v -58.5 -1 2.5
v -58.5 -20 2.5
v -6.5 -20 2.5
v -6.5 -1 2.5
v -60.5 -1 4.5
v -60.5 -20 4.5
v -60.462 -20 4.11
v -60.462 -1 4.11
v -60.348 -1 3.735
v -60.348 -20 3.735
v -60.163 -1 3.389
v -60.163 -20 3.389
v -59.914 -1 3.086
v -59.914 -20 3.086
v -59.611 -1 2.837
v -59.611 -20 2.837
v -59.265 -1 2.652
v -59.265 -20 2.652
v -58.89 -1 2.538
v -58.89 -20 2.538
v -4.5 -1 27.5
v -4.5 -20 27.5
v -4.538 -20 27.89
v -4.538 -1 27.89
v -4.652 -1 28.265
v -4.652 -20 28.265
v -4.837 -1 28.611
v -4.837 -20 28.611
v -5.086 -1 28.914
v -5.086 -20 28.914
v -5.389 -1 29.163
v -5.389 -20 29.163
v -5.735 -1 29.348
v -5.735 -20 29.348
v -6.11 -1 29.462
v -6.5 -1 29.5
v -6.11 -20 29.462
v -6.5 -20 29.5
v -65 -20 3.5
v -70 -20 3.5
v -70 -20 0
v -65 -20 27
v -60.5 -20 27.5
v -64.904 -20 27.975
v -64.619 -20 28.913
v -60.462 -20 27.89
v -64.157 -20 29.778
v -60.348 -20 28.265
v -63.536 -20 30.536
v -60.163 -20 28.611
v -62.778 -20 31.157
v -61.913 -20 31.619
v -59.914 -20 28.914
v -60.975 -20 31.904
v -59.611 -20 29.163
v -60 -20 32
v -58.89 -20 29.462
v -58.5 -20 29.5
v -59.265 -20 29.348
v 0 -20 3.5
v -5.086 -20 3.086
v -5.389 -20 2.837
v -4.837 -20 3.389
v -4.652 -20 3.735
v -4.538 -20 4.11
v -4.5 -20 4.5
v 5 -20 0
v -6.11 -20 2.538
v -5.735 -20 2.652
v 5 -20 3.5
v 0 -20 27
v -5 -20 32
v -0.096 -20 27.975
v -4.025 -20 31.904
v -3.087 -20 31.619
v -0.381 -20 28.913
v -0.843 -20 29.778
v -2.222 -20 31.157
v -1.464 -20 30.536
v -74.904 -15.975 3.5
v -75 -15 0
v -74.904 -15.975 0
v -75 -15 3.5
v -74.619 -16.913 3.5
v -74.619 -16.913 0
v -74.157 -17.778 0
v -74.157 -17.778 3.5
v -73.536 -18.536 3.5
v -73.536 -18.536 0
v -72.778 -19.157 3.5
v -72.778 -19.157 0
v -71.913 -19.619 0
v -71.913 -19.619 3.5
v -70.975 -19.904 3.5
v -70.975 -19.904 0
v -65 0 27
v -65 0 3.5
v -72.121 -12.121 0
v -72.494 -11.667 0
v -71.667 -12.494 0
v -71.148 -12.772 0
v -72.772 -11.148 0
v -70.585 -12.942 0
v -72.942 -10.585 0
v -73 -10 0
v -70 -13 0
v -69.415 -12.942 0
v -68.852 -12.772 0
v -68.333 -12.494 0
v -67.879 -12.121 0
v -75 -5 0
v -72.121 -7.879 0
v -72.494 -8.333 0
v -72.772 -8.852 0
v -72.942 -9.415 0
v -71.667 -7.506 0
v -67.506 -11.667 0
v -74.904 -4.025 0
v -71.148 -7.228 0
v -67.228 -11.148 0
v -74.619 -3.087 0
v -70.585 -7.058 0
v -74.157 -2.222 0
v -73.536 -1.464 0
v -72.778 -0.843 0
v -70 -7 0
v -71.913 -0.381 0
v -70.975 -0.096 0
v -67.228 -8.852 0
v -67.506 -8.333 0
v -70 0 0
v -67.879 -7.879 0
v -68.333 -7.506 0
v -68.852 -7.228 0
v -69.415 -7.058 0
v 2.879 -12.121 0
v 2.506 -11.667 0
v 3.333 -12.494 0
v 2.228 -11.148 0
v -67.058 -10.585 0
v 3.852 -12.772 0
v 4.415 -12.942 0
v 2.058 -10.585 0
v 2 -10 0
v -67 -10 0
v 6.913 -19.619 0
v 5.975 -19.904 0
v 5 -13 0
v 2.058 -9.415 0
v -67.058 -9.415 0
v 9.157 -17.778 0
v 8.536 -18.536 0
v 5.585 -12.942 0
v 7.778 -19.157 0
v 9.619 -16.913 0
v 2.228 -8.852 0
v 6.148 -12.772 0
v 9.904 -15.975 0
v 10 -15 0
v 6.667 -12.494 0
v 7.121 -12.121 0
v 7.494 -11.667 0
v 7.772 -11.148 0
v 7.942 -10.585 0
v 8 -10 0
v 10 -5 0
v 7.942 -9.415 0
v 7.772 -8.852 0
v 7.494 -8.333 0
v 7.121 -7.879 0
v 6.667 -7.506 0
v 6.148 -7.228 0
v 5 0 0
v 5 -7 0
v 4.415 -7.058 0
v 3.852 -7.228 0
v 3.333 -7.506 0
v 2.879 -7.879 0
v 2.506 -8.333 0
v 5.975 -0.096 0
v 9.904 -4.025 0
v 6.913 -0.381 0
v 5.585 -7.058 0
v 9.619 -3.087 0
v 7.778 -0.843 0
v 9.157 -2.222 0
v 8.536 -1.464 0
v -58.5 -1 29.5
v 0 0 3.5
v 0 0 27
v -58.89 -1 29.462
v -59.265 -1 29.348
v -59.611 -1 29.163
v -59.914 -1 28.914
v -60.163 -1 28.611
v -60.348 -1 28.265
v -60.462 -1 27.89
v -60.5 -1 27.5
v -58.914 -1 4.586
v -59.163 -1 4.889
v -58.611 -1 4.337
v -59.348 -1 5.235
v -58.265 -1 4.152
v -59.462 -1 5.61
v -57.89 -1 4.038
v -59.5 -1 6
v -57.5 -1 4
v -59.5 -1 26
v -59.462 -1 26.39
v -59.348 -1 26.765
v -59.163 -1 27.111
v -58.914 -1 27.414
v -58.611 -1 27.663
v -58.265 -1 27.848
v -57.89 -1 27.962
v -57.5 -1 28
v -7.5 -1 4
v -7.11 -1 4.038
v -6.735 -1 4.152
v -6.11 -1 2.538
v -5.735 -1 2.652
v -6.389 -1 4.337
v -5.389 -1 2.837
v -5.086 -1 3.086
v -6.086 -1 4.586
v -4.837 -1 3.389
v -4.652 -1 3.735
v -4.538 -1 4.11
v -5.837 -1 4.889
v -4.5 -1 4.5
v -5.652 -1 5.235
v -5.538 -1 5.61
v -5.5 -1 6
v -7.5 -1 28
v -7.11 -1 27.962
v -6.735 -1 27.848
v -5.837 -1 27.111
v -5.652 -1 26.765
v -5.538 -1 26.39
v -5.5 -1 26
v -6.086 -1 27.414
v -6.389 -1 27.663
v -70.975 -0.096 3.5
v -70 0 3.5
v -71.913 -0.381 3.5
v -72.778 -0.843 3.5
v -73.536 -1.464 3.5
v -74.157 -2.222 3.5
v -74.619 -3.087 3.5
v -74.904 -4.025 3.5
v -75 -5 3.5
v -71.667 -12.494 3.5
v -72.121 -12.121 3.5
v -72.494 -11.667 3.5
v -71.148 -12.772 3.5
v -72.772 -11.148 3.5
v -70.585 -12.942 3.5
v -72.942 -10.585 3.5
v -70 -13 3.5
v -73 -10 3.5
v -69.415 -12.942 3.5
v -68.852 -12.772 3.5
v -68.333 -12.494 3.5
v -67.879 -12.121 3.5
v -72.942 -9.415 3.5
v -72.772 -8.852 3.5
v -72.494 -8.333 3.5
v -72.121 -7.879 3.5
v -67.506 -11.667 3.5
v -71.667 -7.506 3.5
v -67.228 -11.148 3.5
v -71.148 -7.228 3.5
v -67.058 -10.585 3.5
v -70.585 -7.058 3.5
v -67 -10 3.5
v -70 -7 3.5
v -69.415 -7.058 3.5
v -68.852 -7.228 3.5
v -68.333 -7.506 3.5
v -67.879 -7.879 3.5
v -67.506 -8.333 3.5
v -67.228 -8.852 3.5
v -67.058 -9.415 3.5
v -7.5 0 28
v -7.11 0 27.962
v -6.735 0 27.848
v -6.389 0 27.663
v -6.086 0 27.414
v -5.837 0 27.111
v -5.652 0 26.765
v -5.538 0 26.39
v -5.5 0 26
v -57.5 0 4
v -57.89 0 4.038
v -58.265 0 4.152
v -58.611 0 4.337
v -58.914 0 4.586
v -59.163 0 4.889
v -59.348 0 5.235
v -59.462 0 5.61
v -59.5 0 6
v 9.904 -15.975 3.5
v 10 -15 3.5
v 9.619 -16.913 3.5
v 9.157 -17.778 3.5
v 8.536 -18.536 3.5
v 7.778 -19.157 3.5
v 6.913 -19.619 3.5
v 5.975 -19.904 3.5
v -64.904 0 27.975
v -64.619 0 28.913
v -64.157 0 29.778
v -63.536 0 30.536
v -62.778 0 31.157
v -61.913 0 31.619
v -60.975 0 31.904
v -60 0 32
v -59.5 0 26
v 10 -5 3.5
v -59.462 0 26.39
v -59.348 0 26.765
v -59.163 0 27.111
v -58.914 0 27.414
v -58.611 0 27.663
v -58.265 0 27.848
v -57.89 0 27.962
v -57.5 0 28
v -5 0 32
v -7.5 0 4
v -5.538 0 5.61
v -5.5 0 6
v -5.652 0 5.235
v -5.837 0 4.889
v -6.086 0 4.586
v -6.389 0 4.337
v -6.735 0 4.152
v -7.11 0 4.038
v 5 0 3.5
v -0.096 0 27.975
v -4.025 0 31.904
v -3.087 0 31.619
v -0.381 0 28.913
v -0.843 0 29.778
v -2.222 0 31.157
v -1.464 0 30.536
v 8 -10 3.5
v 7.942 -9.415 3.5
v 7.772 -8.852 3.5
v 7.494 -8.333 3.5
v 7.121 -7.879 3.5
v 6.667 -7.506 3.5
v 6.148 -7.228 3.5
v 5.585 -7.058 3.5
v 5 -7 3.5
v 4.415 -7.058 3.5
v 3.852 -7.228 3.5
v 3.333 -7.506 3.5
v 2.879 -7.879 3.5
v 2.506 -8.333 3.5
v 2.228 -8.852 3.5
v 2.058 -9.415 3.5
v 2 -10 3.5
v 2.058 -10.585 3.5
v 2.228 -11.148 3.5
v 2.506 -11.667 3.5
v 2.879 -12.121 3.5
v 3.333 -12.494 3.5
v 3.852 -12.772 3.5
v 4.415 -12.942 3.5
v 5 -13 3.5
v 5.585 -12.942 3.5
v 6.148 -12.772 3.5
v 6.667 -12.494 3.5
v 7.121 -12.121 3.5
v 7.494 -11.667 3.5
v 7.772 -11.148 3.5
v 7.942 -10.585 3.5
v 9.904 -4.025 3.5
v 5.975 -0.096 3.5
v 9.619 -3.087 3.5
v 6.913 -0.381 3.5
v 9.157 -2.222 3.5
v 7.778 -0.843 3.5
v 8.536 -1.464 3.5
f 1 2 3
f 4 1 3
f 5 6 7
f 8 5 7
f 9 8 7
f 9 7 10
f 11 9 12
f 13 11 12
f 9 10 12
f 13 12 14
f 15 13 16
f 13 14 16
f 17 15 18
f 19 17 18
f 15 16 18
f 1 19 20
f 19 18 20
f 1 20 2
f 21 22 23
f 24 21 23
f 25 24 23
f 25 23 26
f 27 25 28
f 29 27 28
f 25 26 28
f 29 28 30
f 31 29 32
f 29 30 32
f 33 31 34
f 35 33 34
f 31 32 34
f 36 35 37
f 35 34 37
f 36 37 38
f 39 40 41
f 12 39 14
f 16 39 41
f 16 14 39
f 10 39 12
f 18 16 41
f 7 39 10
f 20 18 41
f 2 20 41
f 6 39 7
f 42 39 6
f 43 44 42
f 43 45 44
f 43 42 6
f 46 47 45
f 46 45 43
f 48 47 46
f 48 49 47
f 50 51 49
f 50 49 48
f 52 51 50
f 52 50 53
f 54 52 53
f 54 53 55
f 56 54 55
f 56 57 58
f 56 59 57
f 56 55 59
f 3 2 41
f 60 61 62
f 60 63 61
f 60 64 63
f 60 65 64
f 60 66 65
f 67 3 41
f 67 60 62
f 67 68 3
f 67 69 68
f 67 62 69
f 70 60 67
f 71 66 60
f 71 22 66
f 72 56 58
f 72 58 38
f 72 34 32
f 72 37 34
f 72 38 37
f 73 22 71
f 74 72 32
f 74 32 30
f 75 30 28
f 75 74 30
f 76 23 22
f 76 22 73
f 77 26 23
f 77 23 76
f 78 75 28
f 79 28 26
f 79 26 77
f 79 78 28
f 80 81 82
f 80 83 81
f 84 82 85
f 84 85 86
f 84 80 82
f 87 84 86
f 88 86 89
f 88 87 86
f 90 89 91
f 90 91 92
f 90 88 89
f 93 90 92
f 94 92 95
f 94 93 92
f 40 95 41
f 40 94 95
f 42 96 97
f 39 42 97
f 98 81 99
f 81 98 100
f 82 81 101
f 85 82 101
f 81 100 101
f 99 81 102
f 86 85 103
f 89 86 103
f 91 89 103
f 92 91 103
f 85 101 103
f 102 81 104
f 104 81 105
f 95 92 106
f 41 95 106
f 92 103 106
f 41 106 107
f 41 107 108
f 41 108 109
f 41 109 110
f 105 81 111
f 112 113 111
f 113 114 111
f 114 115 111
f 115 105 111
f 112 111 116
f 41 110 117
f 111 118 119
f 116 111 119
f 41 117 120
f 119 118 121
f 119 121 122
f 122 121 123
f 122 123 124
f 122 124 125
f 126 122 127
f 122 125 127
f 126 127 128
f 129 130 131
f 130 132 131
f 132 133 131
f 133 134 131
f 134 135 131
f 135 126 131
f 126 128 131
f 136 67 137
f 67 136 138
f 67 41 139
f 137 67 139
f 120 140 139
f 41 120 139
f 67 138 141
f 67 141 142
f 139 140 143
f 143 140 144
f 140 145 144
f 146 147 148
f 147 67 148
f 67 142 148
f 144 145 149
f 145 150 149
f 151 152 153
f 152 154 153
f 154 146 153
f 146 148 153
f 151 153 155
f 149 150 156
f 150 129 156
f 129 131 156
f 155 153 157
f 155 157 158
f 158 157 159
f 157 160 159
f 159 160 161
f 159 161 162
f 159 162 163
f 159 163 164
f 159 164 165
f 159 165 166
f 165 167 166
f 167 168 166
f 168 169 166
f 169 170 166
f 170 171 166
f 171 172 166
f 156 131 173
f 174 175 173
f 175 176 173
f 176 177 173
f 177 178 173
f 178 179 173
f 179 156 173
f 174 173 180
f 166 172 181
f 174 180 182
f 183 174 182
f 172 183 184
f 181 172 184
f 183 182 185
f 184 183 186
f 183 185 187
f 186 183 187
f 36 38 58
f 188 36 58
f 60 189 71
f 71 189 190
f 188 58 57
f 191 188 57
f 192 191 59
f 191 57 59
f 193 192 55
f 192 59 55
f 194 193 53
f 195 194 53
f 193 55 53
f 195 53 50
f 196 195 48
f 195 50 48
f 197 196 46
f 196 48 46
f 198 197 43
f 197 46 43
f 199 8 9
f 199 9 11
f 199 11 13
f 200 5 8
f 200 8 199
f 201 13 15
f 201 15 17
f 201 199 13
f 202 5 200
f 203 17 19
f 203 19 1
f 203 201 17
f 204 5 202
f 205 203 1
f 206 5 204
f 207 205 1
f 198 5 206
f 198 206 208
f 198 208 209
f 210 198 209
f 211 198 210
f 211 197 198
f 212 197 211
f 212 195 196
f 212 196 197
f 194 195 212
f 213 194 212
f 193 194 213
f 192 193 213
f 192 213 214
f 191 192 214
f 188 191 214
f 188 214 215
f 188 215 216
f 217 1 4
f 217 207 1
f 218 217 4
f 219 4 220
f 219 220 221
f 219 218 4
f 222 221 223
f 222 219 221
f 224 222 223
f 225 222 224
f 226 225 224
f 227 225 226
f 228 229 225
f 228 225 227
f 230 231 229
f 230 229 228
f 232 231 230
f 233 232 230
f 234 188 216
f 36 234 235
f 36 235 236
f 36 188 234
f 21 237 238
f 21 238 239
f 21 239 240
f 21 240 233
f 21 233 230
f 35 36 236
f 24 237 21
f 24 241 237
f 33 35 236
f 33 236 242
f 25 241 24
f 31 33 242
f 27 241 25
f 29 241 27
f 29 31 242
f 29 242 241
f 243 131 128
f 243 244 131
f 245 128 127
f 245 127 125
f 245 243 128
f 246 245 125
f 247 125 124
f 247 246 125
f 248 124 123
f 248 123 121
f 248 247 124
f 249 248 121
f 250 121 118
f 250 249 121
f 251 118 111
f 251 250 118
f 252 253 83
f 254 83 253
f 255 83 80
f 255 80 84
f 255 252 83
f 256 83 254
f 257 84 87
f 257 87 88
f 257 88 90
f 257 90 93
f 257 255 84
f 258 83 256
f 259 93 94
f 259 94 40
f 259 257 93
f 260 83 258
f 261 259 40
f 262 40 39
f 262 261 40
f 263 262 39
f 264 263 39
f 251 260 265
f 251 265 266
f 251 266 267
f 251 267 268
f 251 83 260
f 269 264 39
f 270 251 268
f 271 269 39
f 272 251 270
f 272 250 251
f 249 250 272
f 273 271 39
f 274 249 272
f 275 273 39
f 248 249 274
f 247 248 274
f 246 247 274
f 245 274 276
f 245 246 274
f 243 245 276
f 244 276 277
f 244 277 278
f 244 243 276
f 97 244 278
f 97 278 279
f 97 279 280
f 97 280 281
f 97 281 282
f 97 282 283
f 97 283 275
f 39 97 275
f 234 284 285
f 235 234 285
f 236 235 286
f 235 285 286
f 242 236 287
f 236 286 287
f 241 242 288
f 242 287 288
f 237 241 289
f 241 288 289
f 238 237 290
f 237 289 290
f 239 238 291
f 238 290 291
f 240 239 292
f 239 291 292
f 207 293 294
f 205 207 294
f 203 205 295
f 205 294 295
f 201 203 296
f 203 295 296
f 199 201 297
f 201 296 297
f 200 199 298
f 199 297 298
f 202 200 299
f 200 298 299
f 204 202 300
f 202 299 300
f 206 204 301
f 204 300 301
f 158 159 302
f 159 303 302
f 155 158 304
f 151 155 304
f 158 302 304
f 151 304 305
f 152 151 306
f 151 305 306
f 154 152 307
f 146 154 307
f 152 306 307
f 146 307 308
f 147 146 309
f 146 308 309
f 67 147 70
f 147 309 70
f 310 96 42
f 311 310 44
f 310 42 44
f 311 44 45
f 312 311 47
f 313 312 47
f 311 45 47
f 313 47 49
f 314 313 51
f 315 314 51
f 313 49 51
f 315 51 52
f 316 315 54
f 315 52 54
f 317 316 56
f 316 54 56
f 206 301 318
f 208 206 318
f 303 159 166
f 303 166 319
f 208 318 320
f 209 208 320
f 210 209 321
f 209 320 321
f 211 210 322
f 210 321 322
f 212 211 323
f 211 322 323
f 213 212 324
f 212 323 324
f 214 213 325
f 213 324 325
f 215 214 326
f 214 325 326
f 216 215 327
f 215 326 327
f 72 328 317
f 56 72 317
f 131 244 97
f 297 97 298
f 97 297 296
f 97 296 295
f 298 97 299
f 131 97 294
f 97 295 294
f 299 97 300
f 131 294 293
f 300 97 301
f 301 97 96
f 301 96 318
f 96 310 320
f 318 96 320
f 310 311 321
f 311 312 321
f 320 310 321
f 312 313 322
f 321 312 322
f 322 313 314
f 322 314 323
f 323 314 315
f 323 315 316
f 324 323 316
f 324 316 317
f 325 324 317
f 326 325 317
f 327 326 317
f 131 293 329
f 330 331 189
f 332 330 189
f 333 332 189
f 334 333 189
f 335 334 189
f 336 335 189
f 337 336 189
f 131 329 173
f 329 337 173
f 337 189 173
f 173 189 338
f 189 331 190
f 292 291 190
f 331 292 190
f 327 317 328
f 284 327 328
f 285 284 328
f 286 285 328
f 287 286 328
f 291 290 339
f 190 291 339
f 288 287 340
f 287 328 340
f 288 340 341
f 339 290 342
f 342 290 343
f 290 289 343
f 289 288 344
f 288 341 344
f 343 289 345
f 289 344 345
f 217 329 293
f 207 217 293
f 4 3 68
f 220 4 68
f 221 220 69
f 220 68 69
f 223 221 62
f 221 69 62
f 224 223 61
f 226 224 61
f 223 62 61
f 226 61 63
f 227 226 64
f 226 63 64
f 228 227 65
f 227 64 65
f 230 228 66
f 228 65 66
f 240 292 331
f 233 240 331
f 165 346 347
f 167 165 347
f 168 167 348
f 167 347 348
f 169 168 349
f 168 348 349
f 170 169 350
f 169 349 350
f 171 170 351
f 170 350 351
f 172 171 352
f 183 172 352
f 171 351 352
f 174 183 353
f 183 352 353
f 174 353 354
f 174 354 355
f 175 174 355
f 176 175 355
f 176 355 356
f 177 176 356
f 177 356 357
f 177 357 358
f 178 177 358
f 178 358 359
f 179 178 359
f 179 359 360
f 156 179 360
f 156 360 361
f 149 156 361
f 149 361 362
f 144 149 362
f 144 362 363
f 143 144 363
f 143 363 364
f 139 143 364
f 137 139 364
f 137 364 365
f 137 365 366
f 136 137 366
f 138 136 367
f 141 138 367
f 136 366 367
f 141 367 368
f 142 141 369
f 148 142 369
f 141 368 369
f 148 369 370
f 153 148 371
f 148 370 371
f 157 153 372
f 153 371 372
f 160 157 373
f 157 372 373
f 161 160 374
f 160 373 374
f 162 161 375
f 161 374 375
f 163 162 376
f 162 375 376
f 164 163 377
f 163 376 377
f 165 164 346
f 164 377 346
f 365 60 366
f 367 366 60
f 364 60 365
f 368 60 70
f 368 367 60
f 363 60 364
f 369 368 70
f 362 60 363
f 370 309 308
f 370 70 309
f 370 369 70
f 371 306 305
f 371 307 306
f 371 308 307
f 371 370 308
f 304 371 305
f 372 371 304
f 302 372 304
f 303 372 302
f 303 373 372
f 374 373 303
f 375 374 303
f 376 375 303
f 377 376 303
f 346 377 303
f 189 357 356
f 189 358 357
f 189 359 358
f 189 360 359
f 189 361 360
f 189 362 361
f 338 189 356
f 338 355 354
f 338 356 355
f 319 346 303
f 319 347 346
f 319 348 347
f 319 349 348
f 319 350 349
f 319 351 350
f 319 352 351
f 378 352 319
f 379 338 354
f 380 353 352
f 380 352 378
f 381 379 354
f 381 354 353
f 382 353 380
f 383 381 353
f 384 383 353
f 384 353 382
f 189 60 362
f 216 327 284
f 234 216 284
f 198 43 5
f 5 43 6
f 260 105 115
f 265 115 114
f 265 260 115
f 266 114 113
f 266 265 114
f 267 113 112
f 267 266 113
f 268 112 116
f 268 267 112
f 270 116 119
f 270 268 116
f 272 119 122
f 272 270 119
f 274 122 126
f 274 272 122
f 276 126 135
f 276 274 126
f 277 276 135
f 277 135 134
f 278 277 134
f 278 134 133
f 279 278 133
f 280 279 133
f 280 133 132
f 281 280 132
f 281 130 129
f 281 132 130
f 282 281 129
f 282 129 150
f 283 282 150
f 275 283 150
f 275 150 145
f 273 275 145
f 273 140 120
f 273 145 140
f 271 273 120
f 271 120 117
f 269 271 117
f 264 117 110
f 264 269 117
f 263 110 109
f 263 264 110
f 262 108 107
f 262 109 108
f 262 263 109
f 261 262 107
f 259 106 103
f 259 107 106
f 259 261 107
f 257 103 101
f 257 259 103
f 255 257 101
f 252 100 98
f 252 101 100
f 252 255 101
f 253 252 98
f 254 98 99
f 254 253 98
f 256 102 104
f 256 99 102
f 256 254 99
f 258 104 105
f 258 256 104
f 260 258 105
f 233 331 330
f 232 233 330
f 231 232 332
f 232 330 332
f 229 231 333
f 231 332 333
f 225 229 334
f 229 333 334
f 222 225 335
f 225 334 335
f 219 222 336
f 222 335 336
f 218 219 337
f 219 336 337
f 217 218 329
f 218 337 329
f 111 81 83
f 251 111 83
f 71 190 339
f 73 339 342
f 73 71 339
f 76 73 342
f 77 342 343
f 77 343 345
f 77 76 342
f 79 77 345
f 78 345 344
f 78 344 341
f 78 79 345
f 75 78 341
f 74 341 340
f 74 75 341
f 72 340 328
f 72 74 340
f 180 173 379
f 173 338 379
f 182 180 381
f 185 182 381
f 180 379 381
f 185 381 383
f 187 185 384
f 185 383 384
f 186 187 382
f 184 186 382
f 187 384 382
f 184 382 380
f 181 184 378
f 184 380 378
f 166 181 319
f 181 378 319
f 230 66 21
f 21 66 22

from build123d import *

# Parameters (mm, degrees)
F0_W      = 10
F0_H      = 3.5
F1_DEPTH  = 20
F2_R      = 3
F3_DEPTH  = 3.501
F6_R      = 5
F9_DEPTH  = 19
F10_DEPTH = 5
F11_R     = 5


with BuildPart() as f1:
    # F0 (on Front) → F1 (new body)
    with BuildSketch(Plane.XZ):
        with Locations((-70, 1.75)):
            Rectangle(F0_W, F0_H)
        Polygon((-65, 0), (0, 0), (0, 3.5), (0, 32), (-65, 32), (-65, 3.5), align=None)
        with Locations((5, 1.75)):
            Rectangle(F0_W, F0_H)
    extrude(amount=F1_DEPTH)

    # F2 (on face) → F3 (cut, through all)
    with BuildSketch(Plane.XY.offset(3.5)):
        with Locations((5, -10)):
            Circle(F2_R)
    f3 = extrude(amount=-F3_DEPTH, mode=Mode.SUBTRACT)

    # F5: F3 across plane
    add(f3.mirror(Plane.YZ.offset(-32.5)), mode=Mode.SUBTRACT)

    # F6
    f6_edges = [f1.edges().sort_by_distance(p)[0] for p in [
        (0, -10, 32),
        (-65, -10, 32),
    ]]
    fillet(f6_edges, radius=F6_R)

    # F8 (on face) → F9 (cut)
    with BuildSketch(Plane.XZ.offset(20)):
        with BuildLine():
            Line((-58.5, 2.5), (-6.5, 2.5))
            ThreePointArc((-6.5, 2.5), (-5.0857864376, 3.0857864376), (-4.5, 4.5))
            Line((-4.5, 4.5), (-4.5, 27.5))
            ThreePointArc((-4.5, 27.5), (-5.0857864376, 28.9142135624), (-6.5, 29.5))
            Line((-6.5, 29.5), (-58.5, 29.5))
            ThreePointArc((-58.5, 29.5), (-59.9142135624, 28.9142135624), (-60.5, 27.5))
            Line((-60.5, 27.5), (-60.5, 4.5))
            ThreePointArc((-60.5, 4.5), (-59.9142135624, 3.0857864376), (-58.5, 2.5))
        make_face()
    extrude(amount=-F9_DEPTH, mode=Mode.SUBTRACT)

    # F7 (on face) → F10 (cut)
    with BuildSketch(Plane(origin=(0, 0, 0), x_dir=(-1, 0, 0), z_dir=(0, 1, 0))):
        with BuildLine():
            Line((7.5, 4), (57.5, 4))
            ThreePointArc((57.5, 4), (58.9142135624, 4.5857864376), (59.5, 6))
            Line((59.5, 6), (59.5, 26))
            ThreePointArc((59.5, 26), (58.9142135624, 27.4142135624), (57.5, 28))
            Line((57.5, 28), (7.5, 28))
            ThreePointArc((7.5, 28), (6.0857864376, 27.4142135624), (5.5, 26))
            Line((5.5, 26), (5.5, 6))
            ThreePointArc((5.5, 6), (6.0857864376, 4.5857864376), (7.5, 4))
        make_face()
    extrude(amount=-F10_DEPTH, mode=Mode.SUBTRACT)

    # F11
    f11_edges = [f1.edges().sort_by_distance(p)[0] for p in [
        (-75, -20, 1.75),
        (-75, 0, 1.75),
        (10, -20, 1.75),
        (10, 0, 1.75),
    ]]
    fillet(f11_edges, radius=F11_R)


solid = f1.part
